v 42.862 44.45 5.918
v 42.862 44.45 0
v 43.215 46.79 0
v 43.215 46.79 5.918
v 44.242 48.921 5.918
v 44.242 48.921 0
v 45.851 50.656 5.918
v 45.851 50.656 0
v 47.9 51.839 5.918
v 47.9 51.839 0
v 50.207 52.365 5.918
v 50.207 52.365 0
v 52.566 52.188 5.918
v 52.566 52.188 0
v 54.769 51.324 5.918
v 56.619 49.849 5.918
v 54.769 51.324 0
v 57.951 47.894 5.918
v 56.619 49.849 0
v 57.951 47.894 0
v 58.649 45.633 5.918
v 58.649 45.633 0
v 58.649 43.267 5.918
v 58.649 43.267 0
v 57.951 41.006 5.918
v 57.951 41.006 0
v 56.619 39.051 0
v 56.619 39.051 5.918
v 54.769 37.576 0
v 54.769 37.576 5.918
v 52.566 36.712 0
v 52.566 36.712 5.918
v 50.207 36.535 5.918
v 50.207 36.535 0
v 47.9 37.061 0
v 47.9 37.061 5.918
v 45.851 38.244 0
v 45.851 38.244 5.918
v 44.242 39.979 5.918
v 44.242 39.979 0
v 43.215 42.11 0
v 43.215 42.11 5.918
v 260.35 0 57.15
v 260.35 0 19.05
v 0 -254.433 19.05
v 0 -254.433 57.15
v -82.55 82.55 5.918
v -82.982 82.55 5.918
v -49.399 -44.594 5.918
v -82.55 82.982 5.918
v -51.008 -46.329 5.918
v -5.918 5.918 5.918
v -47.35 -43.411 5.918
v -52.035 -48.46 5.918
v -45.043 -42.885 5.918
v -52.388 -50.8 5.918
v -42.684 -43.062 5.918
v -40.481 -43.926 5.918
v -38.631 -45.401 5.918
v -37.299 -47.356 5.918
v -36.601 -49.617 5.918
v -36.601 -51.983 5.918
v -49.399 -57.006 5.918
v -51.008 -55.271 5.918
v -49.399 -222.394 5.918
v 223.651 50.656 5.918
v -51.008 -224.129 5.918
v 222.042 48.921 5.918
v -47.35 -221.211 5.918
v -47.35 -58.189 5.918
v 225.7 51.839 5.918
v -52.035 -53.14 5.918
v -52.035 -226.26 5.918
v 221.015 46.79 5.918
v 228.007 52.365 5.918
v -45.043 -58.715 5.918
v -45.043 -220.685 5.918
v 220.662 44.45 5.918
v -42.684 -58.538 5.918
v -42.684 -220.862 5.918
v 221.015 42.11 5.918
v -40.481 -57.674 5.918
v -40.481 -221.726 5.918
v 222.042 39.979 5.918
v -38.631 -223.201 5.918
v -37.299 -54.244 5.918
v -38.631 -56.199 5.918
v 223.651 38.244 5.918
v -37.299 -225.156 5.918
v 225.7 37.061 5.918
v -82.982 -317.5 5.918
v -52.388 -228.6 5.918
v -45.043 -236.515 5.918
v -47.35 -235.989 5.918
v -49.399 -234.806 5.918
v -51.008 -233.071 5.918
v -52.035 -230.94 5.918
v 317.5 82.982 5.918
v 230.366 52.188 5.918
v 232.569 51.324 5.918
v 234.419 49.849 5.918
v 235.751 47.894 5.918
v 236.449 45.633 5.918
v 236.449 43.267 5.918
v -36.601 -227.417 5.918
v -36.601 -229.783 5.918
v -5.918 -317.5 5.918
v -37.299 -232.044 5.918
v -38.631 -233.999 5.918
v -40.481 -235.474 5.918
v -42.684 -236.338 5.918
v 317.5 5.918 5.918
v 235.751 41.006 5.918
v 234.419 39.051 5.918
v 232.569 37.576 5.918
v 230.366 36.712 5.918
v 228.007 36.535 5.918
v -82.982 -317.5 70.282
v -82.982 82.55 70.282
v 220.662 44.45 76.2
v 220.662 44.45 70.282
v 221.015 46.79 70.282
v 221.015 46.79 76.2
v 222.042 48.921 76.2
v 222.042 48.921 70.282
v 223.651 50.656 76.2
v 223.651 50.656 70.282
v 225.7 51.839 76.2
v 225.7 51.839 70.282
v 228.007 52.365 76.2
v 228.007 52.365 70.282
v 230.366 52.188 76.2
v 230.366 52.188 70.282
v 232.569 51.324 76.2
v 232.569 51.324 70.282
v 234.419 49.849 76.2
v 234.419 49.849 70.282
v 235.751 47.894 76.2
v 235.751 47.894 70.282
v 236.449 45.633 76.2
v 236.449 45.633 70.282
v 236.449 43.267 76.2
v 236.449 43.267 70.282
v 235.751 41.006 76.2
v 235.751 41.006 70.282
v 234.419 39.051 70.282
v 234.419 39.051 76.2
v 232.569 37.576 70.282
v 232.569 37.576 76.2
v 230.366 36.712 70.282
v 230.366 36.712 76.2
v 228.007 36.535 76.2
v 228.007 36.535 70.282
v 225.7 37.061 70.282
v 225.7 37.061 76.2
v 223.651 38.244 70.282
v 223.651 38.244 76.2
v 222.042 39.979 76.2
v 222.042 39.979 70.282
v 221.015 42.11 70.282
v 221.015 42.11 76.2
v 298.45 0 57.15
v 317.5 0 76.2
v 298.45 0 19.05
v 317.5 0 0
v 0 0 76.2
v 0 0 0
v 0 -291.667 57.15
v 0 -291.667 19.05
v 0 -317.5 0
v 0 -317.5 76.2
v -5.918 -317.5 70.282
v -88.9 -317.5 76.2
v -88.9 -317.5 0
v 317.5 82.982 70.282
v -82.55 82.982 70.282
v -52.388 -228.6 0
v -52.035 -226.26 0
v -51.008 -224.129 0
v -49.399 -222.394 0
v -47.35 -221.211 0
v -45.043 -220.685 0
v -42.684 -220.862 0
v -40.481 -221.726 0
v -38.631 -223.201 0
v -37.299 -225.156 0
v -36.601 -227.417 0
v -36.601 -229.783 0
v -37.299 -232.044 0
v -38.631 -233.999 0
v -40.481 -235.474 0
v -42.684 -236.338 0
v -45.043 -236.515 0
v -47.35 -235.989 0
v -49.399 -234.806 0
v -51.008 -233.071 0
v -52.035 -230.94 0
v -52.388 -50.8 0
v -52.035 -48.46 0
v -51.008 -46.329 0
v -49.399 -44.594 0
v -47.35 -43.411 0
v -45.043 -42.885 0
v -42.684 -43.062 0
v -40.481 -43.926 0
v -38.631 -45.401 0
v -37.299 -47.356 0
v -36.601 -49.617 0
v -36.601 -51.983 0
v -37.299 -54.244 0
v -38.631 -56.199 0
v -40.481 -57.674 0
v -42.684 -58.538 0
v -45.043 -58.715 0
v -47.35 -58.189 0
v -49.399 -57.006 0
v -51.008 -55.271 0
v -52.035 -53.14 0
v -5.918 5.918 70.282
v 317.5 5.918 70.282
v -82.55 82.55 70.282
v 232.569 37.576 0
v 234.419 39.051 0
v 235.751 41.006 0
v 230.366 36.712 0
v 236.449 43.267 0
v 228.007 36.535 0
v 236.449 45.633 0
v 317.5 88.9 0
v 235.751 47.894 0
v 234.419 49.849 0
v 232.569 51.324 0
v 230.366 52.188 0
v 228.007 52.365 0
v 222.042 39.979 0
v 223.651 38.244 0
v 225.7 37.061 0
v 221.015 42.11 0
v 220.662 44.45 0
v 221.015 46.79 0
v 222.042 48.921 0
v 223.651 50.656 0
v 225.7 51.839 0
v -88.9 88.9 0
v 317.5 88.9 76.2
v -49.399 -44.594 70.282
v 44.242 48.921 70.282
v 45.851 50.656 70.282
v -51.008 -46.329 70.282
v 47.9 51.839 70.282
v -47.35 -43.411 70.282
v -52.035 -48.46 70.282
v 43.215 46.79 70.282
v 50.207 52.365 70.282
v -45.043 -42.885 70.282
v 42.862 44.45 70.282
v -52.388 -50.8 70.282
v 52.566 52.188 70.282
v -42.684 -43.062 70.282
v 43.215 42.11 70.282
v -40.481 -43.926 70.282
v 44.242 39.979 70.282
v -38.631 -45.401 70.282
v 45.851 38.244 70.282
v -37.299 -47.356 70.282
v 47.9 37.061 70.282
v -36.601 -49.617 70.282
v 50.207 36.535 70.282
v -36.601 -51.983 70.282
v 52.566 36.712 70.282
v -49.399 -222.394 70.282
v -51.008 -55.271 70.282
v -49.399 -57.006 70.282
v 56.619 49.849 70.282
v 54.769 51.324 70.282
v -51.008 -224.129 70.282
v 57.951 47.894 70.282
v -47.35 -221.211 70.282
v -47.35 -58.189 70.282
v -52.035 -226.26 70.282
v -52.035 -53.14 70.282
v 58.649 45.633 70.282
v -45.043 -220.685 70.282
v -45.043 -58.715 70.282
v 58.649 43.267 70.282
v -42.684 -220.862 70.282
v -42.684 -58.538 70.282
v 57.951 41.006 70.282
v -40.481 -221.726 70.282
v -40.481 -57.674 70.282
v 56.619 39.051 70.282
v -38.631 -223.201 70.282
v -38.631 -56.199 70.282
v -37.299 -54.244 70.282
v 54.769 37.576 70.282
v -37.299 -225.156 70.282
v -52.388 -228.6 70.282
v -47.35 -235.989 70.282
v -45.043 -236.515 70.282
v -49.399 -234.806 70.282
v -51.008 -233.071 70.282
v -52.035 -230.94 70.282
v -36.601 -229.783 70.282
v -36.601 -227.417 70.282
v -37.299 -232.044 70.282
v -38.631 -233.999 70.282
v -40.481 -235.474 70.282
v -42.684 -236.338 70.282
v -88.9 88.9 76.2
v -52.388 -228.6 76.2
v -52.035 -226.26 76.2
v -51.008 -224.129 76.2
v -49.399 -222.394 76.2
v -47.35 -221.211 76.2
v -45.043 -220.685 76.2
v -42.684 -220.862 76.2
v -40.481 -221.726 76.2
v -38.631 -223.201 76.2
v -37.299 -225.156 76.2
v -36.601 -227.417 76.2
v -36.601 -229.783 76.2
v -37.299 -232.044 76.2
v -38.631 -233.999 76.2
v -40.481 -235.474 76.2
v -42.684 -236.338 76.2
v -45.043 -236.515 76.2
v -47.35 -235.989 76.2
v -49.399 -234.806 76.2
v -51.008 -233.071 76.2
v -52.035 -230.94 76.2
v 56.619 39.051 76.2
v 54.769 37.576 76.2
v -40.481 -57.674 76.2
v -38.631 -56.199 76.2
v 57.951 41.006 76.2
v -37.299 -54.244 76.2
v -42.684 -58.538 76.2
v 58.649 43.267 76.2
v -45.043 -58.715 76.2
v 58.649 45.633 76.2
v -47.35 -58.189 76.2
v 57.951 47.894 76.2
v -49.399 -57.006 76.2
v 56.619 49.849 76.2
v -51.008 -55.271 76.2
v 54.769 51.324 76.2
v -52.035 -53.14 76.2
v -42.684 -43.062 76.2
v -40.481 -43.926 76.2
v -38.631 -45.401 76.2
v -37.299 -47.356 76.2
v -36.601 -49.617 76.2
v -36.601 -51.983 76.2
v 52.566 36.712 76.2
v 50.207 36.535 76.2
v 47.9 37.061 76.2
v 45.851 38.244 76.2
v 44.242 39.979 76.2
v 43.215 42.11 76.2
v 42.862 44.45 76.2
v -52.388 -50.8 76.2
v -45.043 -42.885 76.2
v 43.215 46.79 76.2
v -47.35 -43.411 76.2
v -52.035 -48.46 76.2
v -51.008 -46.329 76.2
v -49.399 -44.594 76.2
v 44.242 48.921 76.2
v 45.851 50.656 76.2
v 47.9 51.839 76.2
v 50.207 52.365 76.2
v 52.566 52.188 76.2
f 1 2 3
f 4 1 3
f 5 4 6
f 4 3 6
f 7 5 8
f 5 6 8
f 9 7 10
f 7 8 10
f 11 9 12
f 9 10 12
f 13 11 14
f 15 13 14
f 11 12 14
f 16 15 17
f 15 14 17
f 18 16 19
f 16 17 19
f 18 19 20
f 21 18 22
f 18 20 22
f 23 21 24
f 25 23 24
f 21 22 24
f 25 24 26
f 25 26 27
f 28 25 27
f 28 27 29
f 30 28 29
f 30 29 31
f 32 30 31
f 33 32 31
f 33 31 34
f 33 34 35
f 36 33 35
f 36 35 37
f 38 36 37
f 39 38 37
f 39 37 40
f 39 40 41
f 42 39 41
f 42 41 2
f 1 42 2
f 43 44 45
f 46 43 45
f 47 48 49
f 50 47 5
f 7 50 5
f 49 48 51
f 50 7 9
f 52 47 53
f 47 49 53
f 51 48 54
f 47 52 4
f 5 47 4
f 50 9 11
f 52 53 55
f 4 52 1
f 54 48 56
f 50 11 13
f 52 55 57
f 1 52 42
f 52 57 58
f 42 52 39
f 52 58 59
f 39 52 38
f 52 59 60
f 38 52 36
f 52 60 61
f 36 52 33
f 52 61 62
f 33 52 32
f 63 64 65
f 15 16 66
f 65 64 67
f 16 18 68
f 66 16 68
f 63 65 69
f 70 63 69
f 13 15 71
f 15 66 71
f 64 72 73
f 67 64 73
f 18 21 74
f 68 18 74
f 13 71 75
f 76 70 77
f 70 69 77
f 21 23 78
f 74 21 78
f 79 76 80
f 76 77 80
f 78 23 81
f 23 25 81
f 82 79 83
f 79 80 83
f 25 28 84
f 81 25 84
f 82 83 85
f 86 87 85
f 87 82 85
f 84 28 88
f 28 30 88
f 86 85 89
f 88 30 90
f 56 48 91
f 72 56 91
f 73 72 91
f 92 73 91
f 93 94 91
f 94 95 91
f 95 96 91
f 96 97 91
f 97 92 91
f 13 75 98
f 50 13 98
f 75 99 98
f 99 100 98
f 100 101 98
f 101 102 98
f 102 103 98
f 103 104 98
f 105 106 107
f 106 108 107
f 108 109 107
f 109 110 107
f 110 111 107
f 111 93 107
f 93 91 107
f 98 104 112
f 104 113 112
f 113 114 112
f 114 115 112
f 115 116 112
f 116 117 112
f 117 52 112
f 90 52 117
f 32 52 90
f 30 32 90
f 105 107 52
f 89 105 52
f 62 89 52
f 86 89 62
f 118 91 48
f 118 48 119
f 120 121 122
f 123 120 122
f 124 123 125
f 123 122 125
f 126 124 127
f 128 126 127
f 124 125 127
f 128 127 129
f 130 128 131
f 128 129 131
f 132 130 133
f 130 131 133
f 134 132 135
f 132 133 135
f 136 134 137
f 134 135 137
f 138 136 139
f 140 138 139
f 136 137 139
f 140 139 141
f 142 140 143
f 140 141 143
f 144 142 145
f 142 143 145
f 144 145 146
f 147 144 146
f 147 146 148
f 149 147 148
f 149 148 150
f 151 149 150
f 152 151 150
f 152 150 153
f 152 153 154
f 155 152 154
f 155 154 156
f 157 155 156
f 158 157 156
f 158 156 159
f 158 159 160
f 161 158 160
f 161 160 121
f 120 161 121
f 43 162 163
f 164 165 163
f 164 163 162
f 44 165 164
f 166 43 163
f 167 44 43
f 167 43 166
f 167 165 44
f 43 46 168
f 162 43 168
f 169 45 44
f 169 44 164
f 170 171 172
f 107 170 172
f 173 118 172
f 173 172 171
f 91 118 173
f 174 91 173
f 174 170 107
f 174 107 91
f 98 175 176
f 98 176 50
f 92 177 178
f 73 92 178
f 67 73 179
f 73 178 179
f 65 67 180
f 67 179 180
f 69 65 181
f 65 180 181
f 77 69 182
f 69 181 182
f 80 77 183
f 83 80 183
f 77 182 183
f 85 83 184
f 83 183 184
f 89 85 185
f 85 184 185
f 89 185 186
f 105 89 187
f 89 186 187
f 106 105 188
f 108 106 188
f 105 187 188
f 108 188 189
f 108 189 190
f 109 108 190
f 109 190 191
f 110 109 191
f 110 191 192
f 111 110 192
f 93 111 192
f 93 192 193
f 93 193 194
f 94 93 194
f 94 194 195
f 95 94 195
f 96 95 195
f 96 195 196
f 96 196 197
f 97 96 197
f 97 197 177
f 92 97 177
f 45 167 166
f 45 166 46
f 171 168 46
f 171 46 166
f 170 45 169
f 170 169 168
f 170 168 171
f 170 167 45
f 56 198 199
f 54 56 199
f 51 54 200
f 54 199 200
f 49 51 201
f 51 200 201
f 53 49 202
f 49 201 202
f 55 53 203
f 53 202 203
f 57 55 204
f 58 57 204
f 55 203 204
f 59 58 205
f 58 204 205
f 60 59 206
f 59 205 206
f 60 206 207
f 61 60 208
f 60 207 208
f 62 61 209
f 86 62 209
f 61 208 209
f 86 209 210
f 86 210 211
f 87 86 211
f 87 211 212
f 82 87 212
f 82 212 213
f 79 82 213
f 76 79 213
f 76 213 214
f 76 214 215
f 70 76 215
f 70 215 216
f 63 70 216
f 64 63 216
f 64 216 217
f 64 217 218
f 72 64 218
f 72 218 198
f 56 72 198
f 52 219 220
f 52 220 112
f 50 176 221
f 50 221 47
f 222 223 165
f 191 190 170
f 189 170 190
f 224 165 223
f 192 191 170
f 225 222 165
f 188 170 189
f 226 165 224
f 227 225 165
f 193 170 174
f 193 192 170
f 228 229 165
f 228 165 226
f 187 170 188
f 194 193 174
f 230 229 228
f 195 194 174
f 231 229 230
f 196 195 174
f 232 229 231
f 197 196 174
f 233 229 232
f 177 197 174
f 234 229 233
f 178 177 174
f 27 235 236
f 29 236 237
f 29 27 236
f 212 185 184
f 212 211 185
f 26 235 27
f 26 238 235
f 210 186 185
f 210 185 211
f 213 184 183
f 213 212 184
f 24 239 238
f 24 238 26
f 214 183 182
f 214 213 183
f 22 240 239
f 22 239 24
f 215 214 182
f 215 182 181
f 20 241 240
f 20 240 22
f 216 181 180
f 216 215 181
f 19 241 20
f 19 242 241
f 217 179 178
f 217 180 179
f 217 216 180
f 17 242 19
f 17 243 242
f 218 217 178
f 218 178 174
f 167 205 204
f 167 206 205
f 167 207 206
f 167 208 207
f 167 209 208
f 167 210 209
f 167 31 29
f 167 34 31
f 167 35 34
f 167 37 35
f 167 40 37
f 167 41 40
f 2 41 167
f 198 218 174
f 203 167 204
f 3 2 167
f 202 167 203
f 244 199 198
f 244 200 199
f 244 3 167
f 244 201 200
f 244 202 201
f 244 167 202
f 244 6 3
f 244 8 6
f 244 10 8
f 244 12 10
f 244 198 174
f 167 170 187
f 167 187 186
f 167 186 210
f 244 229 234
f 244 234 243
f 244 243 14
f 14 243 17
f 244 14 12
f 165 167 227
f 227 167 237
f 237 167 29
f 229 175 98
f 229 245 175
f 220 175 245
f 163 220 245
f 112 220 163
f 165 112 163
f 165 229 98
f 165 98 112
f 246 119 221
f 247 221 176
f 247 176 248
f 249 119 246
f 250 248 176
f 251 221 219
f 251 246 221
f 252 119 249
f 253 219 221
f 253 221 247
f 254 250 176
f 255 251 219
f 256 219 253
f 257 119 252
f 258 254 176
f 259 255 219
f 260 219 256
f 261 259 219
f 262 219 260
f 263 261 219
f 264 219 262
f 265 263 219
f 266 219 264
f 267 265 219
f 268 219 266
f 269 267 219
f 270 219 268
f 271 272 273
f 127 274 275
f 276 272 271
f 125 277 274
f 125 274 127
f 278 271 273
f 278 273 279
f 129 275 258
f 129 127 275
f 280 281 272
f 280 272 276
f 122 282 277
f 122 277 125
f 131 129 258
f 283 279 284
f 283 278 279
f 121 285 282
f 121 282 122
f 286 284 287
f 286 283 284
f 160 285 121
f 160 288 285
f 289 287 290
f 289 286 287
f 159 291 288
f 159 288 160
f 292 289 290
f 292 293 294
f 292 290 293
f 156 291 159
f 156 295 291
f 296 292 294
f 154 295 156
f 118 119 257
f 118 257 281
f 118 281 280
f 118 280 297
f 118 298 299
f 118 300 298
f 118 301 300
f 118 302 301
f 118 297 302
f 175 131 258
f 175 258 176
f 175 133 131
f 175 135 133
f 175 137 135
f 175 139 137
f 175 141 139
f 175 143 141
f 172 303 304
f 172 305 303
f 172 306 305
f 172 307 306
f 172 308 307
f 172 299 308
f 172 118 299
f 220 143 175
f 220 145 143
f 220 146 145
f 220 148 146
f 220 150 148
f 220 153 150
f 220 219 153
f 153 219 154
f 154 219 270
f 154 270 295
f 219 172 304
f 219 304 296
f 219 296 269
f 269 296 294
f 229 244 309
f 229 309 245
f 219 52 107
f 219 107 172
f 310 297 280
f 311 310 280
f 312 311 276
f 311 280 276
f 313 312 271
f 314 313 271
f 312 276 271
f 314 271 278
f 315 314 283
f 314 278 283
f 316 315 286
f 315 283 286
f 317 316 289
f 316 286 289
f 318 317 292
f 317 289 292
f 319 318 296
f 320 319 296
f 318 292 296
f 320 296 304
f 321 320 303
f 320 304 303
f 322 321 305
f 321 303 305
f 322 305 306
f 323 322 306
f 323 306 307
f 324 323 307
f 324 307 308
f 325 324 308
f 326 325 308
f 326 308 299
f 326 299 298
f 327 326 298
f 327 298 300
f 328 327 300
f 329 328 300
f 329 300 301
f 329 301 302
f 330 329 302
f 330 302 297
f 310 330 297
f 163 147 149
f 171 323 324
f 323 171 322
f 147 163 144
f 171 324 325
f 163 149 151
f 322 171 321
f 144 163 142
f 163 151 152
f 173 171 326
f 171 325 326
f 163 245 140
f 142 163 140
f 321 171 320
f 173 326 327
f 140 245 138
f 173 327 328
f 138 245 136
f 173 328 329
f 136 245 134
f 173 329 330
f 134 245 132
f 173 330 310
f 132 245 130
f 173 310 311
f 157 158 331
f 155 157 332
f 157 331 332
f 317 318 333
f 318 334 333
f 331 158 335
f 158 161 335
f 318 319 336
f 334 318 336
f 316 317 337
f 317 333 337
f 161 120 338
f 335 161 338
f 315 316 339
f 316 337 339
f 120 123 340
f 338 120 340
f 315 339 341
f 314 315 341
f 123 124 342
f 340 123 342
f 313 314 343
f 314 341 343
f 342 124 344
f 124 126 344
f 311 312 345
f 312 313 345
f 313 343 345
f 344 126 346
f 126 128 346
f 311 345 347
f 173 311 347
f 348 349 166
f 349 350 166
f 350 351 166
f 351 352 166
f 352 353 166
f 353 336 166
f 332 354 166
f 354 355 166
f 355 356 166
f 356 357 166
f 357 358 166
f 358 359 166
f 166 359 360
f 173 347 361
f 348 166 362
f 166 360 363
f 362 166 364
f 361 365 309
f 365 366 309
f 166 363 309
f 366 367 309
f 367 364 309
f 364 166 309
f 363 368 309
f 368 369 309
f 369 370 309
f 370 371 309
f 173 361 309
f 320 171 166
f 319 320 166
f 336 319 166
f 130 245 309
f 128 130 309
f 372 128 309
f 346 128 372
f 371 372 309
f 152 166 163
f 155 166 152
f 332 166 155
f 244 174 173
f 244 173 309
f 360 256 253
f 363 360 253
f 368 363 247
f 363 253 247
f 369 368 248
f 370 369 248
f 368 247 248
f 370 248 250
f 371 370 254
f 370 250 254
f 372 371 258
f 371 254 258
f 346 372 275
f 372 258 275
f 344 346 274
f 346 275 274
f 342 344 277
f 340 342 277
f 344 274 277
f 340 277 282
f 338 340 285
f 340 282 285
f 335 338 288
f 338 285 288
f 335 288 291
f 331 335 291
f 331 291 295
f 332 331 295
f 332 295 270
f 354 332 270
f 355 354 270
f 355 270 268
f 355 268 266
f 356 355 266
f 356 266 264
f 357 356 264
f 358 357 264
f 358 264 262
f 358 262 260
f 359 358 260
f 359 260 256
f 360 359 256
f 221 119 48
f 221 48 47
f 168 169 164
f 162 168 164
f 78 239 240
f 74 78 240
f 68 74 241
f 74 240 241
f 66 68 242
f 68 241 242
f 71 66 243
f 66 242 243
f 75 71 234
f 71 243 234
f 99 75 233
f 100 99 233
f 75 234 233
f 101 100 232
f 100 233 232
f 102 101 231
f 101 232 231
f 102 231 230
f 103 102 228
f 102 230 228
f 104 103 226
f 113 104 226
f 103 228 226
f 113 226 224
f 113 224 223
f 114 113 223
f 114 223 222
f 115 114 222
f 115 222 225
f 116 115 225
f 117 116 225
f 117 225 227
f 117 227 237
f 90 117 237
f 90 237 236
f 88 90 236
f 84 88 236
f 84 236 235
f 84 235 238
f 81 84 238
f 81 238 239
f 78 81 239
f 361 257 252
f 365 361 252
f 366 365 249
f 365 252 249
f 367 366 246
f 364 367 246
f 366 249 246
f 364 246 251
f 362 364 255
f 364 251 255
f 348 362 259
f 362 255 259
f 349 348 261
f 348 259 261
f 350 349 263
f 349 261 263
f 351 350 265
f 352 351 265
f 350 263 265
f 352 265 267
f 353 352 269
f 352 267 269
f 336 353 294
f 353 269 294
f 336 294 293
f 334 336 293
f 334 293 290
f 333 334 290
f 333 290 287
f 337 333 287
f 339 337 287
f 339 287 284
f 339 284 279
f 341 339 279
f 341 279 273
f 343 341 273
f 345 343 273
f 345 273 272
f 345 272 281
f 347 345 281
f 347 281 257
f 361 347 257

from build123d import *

# Parameters (mm, degrees)
BOSS_EXTRUDE1_DEPTH = 76.2
SKETCH2_W           = 64.3636
SKETCH2_H           = 77.0636
CUT_EXTRUDE1_DEPTH  = 400.05
SKETCH3_W           = 77.0636
SKETCH3_H           = 64.3636
CUT_EXTRUDE2_DEPTH  = 400.05
SWEEP2_START        = 19.05
SWEEP2_DEPTH        = 38.1
SKETCH12_R          = 7.9375
CUT_EXTRUDE3_DEPTH  = 400.05


# Read off the part's stored shape, not the designer's step: Sweep2
with BuildPart() as part:
    # Sketch1 → Boss-Extrude1 (new body)
    with BuildSketch(Plane.XY):
        Polygon((0, 0), (0, -317.5), (-88.9, -317.5), (-88.9, 88.9), (317.5, 88.9), (317.5, 0), align=None)
    extrude(amount=BOSS_EXTRUDE1_DEPTH)

    # Sketch2 → Cut-Extrude1 (cut)
    with BuildSketch(Plane(origin=(317.5, 0, 0), x_dir=(0, 0, -1), z_dir=(1, 0, 0))):
        with Locations((-38.1, 44.45)):
            Rectangle(SKETCH2_W, SKETCH2_H)
    extrude(amount=-CUT_EXTRUDE1_DEPTH, mode=Mode.SUBTRACT)

    # Sketch3 → Cut-Extrude2 (cut)
    with BuildSketch(Plane.XZ.offset(317.5)):
        with Locations((-44.45, 38.1)):
            Rectangle(SKETCH3_W, SKETCH3_H)
    extrude(amount=-CUT_EXTRUDE2_DEPTH, mode=Mode.SUBTRACT)

    # Sweep2 outline → Sweep2 (add)
    with BuildSketch(Plane.XY.offset(SWEEP2_START)):
        Polygon((0, -254.432954545), (0, -291.667045455), (298.45, 0), (260.35, 0), align=None)
    extrude(amount=SWEEP2_DEPTH)

    # Sketch12 → Cut-Extrude3 (cut)
    with BuildSketch(Plane(origin=(0, 0, 0), x_dir=(-1, 0, 0), z_dir=(0, 0, -1))):
        with Locations((44.45, -228.6)):
            Circle(SKETCH12_R)
        with Locations((44.45, -50.8)):
            Circle(SKETCH12_R)
        with Locations((-50.8, 44.45)):
            Circle(SKETCH12_R)
        with Locations((-228.6, 44.45)):
            Circle(SKETCH12_R)
    extrude(amount=-CUT_EXTRUDE3_DEPTH, mode=Mode.SUBTRACT)


solid = part.part
